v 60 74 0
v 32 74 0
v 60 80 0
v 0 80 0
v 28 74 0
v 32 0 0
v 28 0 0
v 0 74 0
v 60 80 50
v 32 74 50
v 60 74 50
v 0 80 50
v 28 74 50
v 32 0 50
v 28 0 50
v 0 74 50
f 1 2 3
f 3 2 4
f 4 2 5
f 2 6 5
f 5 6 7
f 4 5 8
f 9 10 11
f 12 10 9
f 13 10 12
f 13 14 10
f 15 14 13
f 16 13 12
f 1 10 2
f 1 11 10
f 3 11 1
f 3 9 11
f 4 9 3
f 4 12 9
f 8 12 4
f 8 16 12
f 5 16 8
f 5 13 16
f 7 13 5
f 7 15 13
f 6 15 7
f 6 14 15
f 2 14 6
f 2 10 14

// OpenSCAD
$fn = 32;

// ----------------------------------------------------------------------
// Structural section: tee 60 x 80 mm
// ----------------------------------------------------------------------

// --- parameters (mm) ---
sec_w = 60;               // tee width, X
sec_h = 80;               // tee height, Y
flange_t = 6;             // top flange thickness
web_t = 4;                // web thickness
plate_t = 50;             // cut length, Z (extrusion height)

profile = [[28, 0], [32, 0], [32, 74], [60, 74], [60, 80], [0, 80], [0, 74], [28, 74]];  // primary outline, 8 points, counter clockwise

// --- the one profile operation ---
linear_extrude(height = plate_t) polygon(points = profile);
